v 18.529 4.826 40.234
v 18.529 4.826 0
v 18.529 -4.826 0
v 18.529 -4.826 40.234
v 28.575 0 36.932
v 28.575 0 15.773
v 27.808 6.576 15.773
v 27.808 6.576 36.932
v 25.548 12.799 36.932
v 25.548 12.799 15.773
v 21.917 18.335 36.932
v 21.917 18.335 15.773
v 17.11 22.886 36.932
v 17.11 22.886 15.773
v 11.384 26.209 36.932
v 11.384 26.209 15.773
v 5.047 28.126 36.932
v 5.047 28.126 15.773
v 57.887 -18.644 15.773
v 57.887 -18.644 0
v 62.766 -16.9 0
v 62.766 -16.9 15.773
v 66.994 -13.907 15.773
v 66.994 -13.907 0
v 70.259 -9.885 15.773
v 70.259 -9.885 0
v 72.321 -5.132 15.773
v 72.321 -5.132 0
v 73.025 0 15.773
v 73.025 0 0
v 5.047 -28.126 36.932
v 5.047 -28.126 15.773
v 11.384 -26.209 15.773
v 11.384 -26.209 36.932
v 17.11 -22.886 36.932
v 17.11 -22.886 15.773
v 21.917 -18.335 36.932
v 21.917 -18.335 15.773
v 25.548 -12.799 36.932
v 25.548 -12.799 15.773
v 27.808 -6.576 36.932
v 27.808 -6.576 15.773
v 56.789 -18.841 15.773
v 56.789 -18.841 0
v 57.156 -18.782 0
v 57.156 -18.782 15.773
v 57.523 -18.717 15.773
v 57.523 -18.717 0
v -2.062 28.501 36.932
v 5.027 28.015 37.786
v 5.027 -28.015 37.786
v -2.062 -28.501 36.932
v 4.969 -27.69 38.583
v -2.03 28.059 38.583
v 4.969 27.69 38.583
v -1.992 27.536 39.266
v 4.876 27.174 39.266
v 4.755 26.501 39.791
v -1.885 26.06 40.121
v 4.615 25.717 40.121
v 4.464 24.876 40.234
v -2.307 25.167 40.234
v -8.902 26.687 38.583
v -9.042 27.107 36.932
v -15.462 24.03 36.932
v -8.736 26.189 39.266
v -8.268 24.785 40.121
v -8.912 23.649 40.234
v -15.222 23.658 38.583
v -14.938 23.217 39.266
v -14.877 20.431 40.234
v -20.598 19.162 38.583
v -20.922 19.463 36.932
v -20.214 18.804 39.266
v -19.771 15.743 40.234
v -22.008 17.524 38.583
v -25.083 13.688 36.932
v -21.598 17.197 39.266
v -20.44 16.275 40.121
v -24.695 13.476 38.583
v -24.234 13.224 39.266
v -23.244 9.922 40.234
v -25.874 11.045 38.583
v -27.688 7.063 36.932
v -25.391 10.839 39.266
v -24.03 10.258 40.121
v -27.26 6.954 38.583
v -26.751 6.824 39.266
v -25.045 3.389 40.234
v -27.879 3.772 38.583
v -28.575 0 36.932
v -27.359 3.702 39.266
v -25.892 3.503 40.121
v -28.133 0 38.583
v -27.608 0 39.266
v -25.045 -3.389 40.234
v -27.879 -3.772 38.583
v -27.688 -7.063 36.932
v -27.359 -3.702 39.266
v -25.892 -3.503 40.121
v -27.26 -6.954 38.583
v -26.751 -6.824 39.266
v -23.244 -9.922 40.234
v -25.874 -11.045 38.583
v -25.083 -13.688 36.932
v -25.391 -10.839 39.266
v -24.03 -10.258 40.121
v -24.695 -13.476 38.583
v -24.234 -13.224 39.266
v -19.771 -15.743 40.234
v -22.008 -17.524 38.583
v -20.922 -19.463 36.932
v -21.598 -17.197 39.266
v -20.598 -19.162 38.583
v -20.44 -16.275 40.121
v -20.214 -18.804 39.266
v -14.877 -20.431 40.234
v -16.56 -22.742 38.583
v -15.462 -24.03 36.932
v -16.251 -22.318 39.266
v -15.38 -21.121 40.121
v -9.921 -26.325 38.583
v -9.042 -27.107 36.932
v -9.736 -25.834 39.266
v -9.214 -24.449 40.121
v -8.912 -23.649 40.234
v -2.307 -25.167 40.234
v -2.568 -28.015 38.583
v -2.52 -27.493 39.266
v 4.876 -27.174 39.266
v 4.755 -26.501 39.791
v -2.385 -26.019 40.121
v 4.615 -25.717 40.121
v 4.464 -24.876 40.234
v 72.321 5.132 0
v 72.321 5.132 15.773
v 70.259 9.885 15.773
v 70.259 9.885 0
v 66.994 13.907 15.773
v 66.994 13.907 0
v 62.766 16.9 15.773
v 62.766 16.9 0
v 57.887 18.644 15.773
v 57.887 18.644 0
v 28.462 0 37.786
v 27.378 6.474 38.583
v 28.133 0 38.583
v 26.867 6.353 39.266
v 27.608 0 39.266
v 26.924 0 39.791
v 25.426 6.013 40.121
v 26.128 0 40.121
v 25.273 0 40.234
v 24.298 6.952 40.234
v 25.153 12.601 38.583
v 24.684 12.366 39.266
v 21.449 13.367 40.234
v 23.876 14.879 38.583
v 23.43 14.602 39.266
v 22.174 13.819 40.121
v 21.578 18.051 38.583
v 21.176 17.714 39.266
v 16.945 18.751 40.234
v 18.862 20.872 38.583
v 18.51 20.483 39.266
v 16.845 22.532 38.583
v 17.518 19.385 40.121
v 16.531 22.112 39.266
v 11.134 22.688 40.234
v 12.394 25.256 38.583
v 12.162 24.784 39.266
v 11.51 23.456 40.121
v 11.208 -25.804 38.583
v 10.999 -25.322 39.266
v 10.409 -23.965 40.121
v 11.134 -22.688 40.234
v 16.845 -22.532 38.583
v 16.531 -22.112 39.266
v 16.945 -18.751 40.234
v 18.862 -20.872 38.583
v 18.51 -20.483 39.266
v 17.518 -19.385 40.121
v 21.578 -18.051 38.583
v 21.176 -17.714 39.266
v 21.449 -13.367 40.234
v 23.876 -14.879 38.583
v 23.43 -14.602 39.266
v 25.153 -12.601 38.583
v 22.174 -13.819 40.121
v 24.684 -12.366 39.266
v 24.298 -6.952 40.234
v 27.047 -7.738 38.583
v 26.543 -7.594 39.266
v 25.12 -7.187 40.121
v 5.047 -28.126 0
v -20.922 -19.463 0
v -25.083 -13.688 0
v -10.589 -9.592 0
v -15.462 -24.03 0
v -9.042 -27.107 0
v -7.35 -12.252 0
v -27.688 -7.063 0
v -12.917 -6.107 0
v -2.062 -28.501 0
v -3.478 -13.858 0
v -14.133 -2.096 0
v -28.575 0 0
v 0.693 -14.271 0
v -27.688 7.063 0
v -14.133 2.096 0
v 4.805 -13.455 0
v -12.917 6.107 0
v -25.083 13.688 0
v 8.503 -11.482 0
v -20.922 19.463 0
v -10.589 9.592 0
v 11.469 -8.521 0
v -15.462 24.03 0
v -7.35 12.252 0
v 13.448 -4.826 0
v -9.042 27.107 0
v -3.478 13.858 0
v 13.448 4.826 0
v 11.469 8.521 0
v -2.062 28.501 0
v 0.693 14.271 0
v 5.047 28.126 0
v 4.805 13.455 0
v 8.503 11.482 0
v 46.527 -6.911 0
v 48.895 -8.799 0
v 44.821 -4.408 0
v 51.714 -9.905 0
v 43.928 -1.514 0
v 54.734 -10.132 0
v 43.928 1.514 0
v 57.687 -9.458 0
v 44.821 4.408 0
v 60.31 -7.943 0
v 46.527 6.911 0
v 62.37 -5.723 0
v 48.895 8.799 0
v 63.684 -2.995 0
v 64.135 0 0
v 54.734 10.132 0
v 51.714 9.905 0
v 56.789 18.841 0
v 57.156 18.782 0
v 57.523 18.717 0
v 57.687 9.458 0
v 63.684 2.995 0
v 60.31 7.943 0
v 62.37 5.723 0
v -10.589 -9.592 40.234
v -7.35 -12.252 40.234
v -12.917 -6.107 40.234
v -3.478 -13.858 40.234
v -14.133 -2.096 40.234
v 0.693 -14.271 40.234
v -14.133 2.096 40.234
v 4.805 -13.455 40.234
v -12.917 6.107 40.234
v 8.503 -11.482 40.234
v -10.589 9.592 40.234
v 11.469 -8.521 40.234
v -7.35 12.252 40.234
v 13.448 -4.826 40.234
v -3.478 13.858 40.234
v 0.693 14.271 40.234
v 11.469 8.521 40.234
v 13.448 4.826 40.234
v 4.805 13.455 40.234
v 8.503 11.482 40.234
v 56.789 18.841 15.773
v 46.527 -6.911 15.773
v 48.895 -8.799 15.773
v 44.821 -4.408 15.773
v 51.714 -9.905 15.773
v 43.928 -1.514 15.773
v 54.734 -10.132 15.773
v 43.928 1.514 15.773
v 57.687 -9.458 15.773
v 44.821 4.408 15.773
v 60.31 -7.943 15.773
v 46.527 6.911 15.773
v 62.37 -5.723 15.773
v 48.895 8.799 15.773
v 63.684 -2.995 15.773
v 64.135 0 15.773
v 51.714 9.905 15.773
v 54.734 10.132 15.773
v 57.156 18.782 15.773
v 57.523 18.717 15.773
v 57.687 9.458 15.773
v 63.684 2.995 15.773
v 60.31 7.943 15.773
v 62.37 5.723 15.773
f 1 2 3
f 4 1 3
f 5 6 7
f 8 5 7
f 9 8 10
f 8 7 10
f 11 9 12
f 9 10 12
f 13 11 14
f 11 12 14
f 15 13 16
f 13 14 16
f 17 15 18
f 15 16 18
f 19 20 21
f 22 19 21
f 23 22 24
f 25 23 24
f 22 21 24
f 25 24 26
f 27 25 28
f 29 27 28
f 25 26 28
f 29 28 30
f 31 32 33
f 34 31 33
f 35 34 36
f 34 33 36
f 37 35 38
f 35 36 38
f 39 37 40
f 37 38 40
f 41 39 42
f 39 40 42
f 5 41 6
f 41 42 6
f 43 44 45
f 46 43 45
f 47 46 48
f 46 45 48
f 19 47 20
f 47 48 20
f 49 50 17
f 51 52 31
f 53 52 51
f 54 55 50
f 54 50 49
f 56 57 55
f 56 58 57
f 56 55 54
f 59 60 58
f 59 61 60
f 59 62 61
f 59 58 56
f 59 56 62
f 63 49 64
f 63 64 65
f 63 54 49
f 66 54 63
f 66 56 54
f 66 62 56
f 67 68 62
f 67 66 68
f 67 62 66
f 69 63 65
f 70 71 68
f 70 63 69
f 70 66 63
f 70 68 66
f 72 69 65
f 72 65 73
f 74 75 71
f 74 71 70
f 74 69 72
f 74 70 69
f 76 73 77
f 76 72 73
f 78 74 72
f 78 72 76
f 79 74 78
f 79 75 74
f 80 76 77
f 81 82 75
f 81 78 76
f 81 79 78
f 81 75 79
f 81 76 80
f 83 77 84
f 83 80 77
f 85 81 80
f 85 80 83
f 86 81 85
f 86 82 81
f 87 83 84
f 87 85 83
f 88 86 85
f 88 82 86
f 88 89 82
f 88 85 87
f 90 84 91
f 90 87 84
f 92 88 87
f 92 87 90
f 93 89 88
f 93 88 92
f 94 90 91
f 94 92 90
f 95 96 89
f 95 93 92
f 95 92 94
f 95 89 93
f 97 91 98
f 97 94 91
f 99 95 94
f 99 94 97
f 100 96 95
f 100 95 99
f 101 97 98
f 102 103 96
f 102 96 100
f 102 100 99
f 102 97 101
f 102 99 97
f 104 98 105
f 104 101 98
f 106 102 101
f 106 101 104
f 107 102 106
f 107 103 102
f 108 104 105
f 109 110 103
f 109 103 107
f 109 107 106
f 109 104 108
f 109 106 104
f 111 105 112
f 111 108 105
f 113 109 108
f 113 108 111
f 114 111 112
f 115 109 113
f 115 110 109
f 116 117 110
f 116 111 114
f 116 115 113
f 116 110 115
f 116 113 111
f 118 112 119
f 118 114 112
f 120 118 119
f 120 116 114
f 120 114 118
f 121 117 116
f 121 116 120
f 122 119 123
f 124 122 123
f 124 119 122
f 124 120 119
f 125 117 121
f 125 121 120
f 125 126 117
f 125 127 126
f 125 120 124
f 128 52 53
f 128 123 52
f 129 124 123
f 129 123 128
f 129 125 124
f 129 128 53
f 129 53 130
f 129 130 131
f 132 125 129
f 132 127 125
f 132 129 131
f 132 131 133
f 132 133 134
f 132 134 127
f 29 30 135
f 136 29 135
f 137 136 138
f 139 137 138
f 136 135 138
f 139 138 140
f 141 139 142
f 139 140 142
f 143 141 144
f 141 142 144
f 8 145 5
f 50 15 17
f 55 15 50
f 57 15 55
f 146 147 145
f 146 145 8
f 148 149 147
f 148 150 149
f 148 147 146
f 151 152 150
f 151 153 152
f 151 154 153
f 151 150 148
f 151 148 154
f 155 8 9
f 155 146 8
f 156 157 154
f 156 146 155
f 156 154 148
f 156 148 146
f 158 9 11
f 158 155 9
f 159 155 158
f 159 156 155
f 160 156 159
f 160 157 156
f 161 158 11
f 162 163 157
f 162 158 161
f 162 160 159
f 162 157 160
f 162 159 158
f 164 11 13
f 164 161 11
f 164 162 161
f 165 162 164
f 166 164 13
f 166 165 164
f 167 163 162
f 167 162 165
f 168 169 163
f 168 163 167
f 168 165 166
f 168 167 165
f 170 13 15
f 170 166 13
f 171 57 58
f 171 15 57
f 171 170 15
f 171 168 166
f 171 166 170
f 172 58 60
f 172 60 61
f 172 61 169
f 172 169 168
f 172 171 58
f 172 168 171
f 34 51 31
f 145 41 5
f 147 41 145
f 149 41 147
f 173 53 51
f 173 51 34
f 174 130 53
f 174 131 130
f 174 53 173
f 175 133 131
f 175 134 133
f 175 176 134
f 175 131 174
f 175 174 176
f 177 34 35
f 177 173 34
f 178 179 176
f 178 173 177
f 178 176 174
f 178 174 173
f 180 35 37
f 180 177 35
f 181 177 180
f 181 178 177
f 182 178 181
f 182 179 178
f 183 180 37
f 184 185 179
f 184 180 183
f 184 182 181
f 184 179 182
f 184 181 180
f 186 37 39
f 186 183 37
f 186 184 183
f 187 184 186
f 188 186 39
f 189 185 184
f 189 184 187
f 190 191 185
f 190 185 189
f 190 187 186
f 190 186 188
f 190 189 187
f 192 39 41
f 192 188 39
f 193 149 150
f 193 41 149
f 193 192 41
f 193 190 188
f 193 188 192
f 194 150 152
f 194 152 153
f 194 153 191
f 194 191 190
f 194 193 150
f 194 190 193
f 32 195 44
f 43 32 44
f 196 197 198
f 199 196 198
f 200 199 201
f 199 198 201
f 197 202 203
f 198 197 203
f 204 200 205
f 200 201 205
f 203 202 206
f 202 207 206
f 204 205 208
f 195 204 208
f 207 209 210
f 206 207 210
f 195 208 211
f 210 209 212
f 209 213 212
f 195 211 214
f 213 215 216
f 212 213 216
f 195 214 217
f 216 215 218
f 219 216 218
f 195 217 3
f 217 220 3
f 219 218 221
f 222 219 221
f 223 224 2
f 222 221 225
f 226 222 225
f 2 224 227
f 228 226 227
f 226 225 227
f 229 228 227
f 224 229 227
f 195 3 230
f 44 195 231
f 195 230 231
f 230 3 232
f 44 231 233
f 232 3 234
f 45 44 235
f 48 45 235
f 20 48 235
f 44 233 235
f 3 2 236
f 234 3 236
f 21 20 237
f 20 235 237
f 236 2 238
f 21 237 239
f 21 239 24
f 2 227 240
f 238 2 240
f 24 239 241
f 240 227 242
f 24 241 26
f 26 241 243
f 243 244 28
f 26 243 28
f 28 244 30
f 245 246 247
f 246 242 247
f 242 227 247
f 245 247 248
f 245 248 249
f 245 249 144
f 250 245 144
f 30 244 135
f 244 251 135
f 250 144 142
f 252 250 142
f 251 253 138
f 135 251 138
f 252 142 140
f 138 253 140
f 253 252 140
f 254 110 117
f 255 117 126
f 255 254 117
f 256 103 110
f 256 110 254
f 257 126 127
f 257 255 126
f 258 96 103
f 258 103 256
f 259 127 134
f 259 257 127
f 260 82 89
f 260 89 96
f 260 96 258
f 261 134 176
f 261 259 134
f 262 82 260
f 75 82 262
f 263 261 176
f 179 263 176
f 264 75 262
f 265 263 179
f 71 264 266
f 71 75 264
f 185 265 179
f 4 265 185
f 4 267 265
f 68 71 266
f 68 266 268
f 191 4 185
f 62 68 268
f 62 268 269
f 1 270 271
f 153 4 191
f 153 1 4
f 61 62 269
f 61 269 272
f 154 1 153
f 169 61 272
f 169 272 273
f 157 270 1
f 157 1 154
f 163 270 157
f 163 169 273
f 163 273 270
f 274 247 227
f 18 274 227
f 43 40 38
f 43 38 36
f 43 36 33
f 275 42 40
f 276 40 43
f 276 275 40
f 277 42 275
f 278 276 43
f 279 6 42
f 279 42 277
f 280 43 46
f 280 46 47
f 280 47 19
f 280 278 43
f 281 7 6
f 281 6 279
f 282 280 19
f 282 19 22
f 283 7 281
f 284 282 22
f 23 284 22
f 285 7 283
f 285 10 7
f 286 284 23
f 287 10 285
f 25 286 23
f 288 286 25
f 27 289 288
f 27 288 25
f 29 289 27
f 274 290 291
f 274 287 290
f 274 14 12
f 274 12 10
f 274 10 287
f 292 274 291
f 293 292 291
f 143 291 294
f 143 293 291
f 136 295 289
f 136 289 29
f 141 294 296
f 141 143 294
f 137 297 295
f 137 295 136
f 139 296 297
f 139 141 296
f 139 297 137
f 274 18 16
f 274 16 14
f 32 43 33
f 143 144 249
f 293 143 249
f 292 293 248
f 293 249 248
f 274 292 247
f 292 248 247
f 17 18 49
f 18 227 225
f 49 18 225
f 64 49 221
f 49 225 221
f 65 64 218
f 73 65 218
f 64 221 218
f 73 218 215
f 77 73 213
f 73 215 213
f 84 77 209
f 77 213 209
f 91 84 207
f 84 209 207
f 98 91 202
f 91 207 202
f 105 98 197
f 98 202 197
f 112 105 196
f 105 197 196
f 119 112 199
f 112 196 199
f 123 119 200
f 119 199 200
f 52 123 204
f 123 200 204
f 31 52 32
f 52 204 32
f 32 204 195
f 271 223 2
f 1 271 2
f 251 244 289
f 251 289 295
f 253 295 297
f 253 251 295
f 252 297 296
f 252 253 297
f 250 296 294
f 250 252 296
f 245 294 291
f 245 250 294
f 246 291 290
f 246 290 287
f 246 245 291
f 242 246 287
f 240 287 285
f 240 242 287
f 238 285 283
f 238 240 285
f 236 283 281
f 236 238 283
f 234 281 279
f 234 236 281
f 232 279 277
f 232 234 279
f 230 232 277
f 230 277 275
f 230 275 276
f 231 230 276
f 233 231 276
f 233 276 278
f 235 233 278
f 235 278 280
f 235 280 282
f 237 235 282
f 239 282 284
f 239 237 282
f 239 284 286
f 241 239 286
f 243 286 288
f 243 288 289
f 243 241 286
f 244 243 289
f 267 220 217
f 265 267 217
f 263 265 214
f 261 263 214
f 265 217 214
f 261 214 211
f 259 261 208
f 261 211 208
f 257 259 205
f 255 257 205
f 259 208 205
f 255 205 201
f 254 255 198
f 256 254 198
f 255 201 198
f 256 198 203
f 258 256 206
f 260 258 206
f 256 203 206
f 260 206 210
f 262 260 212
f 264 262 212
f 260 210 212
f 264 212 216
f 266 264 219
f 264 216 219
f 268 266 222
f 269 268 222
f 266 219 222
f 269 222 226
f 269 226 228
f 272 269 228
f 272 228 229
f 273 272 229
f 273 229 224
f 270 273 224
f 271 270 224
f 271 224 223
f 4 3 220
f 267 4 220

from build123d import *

# Parameters (mm, degrees)
F0_R     = 10.16
F1_DEPTH = 15.7734
F2_DEPTH = 40.2336
F3_R     = 3.302


with BuildPart() as f1:
    # F0 (on Top) → F1 (new body)
    with BuildSketch(Plane.XY):
        with BuildLine():
            ThreePointArc((5.046973, -28.125766), (21.917435, -18.334576), (28.575, 0))
            ThreePointArc((28.575, 0), (21.917435, 18.334576), (5.046973, 28.125766))
            ThreePointArc((5.046973, 28.125766), (-28.575, 0), (5.046973, -28.125766))
        make_face()
        with BuildLine():
            ThreePointArc((13.447765, -4.826), (-14.2875, 0), (13.447765, 4.826))
            Line((13.447765, 4.826), (18.5293, 4.826))
            Line((18.5293, 4.826), (18.5293, -4.826))
            Line((18.5293, -4.826), (13.447765, -4.826))
        make_face(mode=Mode.SUBTRACT)
        with BuildLine():
            ThreePointArc((5.046973, 28.125766), (21.917435, 18.334576), (28.575, 0))
            ThreePointArc((28.575, 0), (21.917435, -18.334576), (5.046973, -28.125766))
            Line((5.046973, -28.125766), (56.789061, -18.841007))
            ThreePointArc((56.789061, -18.841007), (34.925, 0), (56.789061, 18.841007))
            Line((56.789061, 18.841007), (5.046973, 28.125766))
        make_face()
        with BuildLine():
            Line((57.88735, 18.643927), (56.789061, 18.841007))
            ThreePointArc((56.789061, 18.841007), (34.925, 0), (56.789061, -18.841007))
            Line((56.789061, -18.841007), (57.88735, -18.643927))
            ThreePointArc((57.88735, -18.643927), (68.764063, -12.007752), (73.025, 0))
            ThreePointArc((73.025, 0), (68.764063, 12.007752), (57.88735, 18.643927))
        make_face()
        with Locations((53.975, 0)):
            Circle(F0_R, mode=Mode.SUBTRACT)
        with BuildLine():
            ThreePointArc((57.88735, 18.643927), (57.339649, 18.75051), (56.789061, 18.841007))
            Line((56.789061, 18.841007), (57.88735, 18.643927))
        make_face()
        with BuildLine():
            Line((57.88735, -18.643927), (56.789061, -18.841007))
            ThreePointArc((56.789061, -18.841007), (57.339649, -18.75051), (57.88735, -18.643927))
        make_face()
    extrude(amount=F1_DEPTH)

    # F0 (on Top) → F2 (join)
    with BuildSketch(Plane.XY):
        with BuildLine():
            ThreePointArc((5.046973, -28.125766), (21.917435, -18.334576), (28.575, 0))
            ThreePointArc((28.575, 0), (21.917435, 18.334576), (5.046973, 28.125766))
            ThreePointArc((5.046973, 28.125766), (-28.575, 0), (5.046973, -28.125766))
        make_face()
        with BuildLine():
            ThreePointArc((13.447765, -4.826), (-14.2875, 0), (13.447765, 4.826))
            Line((13.447765, 4.826), (18.5293, 4.826))
            Line((18.5293, 4.826), (18.5293, -4.826))
            Line((18.5293, -4.826), (13.447765, -4.826))
        make_face(mode=Mode.SUBTRACT)
    extrude(amount=F2_DEPTH)

    # F3
    f3_edges = [f1.edges().sort_by_distance(p)[0] for p in [
        (-5.046973, 28.125766, 40.2336),
    ]]
    fillet(f3_edges, radius=F3_R)


solid = f1.part
